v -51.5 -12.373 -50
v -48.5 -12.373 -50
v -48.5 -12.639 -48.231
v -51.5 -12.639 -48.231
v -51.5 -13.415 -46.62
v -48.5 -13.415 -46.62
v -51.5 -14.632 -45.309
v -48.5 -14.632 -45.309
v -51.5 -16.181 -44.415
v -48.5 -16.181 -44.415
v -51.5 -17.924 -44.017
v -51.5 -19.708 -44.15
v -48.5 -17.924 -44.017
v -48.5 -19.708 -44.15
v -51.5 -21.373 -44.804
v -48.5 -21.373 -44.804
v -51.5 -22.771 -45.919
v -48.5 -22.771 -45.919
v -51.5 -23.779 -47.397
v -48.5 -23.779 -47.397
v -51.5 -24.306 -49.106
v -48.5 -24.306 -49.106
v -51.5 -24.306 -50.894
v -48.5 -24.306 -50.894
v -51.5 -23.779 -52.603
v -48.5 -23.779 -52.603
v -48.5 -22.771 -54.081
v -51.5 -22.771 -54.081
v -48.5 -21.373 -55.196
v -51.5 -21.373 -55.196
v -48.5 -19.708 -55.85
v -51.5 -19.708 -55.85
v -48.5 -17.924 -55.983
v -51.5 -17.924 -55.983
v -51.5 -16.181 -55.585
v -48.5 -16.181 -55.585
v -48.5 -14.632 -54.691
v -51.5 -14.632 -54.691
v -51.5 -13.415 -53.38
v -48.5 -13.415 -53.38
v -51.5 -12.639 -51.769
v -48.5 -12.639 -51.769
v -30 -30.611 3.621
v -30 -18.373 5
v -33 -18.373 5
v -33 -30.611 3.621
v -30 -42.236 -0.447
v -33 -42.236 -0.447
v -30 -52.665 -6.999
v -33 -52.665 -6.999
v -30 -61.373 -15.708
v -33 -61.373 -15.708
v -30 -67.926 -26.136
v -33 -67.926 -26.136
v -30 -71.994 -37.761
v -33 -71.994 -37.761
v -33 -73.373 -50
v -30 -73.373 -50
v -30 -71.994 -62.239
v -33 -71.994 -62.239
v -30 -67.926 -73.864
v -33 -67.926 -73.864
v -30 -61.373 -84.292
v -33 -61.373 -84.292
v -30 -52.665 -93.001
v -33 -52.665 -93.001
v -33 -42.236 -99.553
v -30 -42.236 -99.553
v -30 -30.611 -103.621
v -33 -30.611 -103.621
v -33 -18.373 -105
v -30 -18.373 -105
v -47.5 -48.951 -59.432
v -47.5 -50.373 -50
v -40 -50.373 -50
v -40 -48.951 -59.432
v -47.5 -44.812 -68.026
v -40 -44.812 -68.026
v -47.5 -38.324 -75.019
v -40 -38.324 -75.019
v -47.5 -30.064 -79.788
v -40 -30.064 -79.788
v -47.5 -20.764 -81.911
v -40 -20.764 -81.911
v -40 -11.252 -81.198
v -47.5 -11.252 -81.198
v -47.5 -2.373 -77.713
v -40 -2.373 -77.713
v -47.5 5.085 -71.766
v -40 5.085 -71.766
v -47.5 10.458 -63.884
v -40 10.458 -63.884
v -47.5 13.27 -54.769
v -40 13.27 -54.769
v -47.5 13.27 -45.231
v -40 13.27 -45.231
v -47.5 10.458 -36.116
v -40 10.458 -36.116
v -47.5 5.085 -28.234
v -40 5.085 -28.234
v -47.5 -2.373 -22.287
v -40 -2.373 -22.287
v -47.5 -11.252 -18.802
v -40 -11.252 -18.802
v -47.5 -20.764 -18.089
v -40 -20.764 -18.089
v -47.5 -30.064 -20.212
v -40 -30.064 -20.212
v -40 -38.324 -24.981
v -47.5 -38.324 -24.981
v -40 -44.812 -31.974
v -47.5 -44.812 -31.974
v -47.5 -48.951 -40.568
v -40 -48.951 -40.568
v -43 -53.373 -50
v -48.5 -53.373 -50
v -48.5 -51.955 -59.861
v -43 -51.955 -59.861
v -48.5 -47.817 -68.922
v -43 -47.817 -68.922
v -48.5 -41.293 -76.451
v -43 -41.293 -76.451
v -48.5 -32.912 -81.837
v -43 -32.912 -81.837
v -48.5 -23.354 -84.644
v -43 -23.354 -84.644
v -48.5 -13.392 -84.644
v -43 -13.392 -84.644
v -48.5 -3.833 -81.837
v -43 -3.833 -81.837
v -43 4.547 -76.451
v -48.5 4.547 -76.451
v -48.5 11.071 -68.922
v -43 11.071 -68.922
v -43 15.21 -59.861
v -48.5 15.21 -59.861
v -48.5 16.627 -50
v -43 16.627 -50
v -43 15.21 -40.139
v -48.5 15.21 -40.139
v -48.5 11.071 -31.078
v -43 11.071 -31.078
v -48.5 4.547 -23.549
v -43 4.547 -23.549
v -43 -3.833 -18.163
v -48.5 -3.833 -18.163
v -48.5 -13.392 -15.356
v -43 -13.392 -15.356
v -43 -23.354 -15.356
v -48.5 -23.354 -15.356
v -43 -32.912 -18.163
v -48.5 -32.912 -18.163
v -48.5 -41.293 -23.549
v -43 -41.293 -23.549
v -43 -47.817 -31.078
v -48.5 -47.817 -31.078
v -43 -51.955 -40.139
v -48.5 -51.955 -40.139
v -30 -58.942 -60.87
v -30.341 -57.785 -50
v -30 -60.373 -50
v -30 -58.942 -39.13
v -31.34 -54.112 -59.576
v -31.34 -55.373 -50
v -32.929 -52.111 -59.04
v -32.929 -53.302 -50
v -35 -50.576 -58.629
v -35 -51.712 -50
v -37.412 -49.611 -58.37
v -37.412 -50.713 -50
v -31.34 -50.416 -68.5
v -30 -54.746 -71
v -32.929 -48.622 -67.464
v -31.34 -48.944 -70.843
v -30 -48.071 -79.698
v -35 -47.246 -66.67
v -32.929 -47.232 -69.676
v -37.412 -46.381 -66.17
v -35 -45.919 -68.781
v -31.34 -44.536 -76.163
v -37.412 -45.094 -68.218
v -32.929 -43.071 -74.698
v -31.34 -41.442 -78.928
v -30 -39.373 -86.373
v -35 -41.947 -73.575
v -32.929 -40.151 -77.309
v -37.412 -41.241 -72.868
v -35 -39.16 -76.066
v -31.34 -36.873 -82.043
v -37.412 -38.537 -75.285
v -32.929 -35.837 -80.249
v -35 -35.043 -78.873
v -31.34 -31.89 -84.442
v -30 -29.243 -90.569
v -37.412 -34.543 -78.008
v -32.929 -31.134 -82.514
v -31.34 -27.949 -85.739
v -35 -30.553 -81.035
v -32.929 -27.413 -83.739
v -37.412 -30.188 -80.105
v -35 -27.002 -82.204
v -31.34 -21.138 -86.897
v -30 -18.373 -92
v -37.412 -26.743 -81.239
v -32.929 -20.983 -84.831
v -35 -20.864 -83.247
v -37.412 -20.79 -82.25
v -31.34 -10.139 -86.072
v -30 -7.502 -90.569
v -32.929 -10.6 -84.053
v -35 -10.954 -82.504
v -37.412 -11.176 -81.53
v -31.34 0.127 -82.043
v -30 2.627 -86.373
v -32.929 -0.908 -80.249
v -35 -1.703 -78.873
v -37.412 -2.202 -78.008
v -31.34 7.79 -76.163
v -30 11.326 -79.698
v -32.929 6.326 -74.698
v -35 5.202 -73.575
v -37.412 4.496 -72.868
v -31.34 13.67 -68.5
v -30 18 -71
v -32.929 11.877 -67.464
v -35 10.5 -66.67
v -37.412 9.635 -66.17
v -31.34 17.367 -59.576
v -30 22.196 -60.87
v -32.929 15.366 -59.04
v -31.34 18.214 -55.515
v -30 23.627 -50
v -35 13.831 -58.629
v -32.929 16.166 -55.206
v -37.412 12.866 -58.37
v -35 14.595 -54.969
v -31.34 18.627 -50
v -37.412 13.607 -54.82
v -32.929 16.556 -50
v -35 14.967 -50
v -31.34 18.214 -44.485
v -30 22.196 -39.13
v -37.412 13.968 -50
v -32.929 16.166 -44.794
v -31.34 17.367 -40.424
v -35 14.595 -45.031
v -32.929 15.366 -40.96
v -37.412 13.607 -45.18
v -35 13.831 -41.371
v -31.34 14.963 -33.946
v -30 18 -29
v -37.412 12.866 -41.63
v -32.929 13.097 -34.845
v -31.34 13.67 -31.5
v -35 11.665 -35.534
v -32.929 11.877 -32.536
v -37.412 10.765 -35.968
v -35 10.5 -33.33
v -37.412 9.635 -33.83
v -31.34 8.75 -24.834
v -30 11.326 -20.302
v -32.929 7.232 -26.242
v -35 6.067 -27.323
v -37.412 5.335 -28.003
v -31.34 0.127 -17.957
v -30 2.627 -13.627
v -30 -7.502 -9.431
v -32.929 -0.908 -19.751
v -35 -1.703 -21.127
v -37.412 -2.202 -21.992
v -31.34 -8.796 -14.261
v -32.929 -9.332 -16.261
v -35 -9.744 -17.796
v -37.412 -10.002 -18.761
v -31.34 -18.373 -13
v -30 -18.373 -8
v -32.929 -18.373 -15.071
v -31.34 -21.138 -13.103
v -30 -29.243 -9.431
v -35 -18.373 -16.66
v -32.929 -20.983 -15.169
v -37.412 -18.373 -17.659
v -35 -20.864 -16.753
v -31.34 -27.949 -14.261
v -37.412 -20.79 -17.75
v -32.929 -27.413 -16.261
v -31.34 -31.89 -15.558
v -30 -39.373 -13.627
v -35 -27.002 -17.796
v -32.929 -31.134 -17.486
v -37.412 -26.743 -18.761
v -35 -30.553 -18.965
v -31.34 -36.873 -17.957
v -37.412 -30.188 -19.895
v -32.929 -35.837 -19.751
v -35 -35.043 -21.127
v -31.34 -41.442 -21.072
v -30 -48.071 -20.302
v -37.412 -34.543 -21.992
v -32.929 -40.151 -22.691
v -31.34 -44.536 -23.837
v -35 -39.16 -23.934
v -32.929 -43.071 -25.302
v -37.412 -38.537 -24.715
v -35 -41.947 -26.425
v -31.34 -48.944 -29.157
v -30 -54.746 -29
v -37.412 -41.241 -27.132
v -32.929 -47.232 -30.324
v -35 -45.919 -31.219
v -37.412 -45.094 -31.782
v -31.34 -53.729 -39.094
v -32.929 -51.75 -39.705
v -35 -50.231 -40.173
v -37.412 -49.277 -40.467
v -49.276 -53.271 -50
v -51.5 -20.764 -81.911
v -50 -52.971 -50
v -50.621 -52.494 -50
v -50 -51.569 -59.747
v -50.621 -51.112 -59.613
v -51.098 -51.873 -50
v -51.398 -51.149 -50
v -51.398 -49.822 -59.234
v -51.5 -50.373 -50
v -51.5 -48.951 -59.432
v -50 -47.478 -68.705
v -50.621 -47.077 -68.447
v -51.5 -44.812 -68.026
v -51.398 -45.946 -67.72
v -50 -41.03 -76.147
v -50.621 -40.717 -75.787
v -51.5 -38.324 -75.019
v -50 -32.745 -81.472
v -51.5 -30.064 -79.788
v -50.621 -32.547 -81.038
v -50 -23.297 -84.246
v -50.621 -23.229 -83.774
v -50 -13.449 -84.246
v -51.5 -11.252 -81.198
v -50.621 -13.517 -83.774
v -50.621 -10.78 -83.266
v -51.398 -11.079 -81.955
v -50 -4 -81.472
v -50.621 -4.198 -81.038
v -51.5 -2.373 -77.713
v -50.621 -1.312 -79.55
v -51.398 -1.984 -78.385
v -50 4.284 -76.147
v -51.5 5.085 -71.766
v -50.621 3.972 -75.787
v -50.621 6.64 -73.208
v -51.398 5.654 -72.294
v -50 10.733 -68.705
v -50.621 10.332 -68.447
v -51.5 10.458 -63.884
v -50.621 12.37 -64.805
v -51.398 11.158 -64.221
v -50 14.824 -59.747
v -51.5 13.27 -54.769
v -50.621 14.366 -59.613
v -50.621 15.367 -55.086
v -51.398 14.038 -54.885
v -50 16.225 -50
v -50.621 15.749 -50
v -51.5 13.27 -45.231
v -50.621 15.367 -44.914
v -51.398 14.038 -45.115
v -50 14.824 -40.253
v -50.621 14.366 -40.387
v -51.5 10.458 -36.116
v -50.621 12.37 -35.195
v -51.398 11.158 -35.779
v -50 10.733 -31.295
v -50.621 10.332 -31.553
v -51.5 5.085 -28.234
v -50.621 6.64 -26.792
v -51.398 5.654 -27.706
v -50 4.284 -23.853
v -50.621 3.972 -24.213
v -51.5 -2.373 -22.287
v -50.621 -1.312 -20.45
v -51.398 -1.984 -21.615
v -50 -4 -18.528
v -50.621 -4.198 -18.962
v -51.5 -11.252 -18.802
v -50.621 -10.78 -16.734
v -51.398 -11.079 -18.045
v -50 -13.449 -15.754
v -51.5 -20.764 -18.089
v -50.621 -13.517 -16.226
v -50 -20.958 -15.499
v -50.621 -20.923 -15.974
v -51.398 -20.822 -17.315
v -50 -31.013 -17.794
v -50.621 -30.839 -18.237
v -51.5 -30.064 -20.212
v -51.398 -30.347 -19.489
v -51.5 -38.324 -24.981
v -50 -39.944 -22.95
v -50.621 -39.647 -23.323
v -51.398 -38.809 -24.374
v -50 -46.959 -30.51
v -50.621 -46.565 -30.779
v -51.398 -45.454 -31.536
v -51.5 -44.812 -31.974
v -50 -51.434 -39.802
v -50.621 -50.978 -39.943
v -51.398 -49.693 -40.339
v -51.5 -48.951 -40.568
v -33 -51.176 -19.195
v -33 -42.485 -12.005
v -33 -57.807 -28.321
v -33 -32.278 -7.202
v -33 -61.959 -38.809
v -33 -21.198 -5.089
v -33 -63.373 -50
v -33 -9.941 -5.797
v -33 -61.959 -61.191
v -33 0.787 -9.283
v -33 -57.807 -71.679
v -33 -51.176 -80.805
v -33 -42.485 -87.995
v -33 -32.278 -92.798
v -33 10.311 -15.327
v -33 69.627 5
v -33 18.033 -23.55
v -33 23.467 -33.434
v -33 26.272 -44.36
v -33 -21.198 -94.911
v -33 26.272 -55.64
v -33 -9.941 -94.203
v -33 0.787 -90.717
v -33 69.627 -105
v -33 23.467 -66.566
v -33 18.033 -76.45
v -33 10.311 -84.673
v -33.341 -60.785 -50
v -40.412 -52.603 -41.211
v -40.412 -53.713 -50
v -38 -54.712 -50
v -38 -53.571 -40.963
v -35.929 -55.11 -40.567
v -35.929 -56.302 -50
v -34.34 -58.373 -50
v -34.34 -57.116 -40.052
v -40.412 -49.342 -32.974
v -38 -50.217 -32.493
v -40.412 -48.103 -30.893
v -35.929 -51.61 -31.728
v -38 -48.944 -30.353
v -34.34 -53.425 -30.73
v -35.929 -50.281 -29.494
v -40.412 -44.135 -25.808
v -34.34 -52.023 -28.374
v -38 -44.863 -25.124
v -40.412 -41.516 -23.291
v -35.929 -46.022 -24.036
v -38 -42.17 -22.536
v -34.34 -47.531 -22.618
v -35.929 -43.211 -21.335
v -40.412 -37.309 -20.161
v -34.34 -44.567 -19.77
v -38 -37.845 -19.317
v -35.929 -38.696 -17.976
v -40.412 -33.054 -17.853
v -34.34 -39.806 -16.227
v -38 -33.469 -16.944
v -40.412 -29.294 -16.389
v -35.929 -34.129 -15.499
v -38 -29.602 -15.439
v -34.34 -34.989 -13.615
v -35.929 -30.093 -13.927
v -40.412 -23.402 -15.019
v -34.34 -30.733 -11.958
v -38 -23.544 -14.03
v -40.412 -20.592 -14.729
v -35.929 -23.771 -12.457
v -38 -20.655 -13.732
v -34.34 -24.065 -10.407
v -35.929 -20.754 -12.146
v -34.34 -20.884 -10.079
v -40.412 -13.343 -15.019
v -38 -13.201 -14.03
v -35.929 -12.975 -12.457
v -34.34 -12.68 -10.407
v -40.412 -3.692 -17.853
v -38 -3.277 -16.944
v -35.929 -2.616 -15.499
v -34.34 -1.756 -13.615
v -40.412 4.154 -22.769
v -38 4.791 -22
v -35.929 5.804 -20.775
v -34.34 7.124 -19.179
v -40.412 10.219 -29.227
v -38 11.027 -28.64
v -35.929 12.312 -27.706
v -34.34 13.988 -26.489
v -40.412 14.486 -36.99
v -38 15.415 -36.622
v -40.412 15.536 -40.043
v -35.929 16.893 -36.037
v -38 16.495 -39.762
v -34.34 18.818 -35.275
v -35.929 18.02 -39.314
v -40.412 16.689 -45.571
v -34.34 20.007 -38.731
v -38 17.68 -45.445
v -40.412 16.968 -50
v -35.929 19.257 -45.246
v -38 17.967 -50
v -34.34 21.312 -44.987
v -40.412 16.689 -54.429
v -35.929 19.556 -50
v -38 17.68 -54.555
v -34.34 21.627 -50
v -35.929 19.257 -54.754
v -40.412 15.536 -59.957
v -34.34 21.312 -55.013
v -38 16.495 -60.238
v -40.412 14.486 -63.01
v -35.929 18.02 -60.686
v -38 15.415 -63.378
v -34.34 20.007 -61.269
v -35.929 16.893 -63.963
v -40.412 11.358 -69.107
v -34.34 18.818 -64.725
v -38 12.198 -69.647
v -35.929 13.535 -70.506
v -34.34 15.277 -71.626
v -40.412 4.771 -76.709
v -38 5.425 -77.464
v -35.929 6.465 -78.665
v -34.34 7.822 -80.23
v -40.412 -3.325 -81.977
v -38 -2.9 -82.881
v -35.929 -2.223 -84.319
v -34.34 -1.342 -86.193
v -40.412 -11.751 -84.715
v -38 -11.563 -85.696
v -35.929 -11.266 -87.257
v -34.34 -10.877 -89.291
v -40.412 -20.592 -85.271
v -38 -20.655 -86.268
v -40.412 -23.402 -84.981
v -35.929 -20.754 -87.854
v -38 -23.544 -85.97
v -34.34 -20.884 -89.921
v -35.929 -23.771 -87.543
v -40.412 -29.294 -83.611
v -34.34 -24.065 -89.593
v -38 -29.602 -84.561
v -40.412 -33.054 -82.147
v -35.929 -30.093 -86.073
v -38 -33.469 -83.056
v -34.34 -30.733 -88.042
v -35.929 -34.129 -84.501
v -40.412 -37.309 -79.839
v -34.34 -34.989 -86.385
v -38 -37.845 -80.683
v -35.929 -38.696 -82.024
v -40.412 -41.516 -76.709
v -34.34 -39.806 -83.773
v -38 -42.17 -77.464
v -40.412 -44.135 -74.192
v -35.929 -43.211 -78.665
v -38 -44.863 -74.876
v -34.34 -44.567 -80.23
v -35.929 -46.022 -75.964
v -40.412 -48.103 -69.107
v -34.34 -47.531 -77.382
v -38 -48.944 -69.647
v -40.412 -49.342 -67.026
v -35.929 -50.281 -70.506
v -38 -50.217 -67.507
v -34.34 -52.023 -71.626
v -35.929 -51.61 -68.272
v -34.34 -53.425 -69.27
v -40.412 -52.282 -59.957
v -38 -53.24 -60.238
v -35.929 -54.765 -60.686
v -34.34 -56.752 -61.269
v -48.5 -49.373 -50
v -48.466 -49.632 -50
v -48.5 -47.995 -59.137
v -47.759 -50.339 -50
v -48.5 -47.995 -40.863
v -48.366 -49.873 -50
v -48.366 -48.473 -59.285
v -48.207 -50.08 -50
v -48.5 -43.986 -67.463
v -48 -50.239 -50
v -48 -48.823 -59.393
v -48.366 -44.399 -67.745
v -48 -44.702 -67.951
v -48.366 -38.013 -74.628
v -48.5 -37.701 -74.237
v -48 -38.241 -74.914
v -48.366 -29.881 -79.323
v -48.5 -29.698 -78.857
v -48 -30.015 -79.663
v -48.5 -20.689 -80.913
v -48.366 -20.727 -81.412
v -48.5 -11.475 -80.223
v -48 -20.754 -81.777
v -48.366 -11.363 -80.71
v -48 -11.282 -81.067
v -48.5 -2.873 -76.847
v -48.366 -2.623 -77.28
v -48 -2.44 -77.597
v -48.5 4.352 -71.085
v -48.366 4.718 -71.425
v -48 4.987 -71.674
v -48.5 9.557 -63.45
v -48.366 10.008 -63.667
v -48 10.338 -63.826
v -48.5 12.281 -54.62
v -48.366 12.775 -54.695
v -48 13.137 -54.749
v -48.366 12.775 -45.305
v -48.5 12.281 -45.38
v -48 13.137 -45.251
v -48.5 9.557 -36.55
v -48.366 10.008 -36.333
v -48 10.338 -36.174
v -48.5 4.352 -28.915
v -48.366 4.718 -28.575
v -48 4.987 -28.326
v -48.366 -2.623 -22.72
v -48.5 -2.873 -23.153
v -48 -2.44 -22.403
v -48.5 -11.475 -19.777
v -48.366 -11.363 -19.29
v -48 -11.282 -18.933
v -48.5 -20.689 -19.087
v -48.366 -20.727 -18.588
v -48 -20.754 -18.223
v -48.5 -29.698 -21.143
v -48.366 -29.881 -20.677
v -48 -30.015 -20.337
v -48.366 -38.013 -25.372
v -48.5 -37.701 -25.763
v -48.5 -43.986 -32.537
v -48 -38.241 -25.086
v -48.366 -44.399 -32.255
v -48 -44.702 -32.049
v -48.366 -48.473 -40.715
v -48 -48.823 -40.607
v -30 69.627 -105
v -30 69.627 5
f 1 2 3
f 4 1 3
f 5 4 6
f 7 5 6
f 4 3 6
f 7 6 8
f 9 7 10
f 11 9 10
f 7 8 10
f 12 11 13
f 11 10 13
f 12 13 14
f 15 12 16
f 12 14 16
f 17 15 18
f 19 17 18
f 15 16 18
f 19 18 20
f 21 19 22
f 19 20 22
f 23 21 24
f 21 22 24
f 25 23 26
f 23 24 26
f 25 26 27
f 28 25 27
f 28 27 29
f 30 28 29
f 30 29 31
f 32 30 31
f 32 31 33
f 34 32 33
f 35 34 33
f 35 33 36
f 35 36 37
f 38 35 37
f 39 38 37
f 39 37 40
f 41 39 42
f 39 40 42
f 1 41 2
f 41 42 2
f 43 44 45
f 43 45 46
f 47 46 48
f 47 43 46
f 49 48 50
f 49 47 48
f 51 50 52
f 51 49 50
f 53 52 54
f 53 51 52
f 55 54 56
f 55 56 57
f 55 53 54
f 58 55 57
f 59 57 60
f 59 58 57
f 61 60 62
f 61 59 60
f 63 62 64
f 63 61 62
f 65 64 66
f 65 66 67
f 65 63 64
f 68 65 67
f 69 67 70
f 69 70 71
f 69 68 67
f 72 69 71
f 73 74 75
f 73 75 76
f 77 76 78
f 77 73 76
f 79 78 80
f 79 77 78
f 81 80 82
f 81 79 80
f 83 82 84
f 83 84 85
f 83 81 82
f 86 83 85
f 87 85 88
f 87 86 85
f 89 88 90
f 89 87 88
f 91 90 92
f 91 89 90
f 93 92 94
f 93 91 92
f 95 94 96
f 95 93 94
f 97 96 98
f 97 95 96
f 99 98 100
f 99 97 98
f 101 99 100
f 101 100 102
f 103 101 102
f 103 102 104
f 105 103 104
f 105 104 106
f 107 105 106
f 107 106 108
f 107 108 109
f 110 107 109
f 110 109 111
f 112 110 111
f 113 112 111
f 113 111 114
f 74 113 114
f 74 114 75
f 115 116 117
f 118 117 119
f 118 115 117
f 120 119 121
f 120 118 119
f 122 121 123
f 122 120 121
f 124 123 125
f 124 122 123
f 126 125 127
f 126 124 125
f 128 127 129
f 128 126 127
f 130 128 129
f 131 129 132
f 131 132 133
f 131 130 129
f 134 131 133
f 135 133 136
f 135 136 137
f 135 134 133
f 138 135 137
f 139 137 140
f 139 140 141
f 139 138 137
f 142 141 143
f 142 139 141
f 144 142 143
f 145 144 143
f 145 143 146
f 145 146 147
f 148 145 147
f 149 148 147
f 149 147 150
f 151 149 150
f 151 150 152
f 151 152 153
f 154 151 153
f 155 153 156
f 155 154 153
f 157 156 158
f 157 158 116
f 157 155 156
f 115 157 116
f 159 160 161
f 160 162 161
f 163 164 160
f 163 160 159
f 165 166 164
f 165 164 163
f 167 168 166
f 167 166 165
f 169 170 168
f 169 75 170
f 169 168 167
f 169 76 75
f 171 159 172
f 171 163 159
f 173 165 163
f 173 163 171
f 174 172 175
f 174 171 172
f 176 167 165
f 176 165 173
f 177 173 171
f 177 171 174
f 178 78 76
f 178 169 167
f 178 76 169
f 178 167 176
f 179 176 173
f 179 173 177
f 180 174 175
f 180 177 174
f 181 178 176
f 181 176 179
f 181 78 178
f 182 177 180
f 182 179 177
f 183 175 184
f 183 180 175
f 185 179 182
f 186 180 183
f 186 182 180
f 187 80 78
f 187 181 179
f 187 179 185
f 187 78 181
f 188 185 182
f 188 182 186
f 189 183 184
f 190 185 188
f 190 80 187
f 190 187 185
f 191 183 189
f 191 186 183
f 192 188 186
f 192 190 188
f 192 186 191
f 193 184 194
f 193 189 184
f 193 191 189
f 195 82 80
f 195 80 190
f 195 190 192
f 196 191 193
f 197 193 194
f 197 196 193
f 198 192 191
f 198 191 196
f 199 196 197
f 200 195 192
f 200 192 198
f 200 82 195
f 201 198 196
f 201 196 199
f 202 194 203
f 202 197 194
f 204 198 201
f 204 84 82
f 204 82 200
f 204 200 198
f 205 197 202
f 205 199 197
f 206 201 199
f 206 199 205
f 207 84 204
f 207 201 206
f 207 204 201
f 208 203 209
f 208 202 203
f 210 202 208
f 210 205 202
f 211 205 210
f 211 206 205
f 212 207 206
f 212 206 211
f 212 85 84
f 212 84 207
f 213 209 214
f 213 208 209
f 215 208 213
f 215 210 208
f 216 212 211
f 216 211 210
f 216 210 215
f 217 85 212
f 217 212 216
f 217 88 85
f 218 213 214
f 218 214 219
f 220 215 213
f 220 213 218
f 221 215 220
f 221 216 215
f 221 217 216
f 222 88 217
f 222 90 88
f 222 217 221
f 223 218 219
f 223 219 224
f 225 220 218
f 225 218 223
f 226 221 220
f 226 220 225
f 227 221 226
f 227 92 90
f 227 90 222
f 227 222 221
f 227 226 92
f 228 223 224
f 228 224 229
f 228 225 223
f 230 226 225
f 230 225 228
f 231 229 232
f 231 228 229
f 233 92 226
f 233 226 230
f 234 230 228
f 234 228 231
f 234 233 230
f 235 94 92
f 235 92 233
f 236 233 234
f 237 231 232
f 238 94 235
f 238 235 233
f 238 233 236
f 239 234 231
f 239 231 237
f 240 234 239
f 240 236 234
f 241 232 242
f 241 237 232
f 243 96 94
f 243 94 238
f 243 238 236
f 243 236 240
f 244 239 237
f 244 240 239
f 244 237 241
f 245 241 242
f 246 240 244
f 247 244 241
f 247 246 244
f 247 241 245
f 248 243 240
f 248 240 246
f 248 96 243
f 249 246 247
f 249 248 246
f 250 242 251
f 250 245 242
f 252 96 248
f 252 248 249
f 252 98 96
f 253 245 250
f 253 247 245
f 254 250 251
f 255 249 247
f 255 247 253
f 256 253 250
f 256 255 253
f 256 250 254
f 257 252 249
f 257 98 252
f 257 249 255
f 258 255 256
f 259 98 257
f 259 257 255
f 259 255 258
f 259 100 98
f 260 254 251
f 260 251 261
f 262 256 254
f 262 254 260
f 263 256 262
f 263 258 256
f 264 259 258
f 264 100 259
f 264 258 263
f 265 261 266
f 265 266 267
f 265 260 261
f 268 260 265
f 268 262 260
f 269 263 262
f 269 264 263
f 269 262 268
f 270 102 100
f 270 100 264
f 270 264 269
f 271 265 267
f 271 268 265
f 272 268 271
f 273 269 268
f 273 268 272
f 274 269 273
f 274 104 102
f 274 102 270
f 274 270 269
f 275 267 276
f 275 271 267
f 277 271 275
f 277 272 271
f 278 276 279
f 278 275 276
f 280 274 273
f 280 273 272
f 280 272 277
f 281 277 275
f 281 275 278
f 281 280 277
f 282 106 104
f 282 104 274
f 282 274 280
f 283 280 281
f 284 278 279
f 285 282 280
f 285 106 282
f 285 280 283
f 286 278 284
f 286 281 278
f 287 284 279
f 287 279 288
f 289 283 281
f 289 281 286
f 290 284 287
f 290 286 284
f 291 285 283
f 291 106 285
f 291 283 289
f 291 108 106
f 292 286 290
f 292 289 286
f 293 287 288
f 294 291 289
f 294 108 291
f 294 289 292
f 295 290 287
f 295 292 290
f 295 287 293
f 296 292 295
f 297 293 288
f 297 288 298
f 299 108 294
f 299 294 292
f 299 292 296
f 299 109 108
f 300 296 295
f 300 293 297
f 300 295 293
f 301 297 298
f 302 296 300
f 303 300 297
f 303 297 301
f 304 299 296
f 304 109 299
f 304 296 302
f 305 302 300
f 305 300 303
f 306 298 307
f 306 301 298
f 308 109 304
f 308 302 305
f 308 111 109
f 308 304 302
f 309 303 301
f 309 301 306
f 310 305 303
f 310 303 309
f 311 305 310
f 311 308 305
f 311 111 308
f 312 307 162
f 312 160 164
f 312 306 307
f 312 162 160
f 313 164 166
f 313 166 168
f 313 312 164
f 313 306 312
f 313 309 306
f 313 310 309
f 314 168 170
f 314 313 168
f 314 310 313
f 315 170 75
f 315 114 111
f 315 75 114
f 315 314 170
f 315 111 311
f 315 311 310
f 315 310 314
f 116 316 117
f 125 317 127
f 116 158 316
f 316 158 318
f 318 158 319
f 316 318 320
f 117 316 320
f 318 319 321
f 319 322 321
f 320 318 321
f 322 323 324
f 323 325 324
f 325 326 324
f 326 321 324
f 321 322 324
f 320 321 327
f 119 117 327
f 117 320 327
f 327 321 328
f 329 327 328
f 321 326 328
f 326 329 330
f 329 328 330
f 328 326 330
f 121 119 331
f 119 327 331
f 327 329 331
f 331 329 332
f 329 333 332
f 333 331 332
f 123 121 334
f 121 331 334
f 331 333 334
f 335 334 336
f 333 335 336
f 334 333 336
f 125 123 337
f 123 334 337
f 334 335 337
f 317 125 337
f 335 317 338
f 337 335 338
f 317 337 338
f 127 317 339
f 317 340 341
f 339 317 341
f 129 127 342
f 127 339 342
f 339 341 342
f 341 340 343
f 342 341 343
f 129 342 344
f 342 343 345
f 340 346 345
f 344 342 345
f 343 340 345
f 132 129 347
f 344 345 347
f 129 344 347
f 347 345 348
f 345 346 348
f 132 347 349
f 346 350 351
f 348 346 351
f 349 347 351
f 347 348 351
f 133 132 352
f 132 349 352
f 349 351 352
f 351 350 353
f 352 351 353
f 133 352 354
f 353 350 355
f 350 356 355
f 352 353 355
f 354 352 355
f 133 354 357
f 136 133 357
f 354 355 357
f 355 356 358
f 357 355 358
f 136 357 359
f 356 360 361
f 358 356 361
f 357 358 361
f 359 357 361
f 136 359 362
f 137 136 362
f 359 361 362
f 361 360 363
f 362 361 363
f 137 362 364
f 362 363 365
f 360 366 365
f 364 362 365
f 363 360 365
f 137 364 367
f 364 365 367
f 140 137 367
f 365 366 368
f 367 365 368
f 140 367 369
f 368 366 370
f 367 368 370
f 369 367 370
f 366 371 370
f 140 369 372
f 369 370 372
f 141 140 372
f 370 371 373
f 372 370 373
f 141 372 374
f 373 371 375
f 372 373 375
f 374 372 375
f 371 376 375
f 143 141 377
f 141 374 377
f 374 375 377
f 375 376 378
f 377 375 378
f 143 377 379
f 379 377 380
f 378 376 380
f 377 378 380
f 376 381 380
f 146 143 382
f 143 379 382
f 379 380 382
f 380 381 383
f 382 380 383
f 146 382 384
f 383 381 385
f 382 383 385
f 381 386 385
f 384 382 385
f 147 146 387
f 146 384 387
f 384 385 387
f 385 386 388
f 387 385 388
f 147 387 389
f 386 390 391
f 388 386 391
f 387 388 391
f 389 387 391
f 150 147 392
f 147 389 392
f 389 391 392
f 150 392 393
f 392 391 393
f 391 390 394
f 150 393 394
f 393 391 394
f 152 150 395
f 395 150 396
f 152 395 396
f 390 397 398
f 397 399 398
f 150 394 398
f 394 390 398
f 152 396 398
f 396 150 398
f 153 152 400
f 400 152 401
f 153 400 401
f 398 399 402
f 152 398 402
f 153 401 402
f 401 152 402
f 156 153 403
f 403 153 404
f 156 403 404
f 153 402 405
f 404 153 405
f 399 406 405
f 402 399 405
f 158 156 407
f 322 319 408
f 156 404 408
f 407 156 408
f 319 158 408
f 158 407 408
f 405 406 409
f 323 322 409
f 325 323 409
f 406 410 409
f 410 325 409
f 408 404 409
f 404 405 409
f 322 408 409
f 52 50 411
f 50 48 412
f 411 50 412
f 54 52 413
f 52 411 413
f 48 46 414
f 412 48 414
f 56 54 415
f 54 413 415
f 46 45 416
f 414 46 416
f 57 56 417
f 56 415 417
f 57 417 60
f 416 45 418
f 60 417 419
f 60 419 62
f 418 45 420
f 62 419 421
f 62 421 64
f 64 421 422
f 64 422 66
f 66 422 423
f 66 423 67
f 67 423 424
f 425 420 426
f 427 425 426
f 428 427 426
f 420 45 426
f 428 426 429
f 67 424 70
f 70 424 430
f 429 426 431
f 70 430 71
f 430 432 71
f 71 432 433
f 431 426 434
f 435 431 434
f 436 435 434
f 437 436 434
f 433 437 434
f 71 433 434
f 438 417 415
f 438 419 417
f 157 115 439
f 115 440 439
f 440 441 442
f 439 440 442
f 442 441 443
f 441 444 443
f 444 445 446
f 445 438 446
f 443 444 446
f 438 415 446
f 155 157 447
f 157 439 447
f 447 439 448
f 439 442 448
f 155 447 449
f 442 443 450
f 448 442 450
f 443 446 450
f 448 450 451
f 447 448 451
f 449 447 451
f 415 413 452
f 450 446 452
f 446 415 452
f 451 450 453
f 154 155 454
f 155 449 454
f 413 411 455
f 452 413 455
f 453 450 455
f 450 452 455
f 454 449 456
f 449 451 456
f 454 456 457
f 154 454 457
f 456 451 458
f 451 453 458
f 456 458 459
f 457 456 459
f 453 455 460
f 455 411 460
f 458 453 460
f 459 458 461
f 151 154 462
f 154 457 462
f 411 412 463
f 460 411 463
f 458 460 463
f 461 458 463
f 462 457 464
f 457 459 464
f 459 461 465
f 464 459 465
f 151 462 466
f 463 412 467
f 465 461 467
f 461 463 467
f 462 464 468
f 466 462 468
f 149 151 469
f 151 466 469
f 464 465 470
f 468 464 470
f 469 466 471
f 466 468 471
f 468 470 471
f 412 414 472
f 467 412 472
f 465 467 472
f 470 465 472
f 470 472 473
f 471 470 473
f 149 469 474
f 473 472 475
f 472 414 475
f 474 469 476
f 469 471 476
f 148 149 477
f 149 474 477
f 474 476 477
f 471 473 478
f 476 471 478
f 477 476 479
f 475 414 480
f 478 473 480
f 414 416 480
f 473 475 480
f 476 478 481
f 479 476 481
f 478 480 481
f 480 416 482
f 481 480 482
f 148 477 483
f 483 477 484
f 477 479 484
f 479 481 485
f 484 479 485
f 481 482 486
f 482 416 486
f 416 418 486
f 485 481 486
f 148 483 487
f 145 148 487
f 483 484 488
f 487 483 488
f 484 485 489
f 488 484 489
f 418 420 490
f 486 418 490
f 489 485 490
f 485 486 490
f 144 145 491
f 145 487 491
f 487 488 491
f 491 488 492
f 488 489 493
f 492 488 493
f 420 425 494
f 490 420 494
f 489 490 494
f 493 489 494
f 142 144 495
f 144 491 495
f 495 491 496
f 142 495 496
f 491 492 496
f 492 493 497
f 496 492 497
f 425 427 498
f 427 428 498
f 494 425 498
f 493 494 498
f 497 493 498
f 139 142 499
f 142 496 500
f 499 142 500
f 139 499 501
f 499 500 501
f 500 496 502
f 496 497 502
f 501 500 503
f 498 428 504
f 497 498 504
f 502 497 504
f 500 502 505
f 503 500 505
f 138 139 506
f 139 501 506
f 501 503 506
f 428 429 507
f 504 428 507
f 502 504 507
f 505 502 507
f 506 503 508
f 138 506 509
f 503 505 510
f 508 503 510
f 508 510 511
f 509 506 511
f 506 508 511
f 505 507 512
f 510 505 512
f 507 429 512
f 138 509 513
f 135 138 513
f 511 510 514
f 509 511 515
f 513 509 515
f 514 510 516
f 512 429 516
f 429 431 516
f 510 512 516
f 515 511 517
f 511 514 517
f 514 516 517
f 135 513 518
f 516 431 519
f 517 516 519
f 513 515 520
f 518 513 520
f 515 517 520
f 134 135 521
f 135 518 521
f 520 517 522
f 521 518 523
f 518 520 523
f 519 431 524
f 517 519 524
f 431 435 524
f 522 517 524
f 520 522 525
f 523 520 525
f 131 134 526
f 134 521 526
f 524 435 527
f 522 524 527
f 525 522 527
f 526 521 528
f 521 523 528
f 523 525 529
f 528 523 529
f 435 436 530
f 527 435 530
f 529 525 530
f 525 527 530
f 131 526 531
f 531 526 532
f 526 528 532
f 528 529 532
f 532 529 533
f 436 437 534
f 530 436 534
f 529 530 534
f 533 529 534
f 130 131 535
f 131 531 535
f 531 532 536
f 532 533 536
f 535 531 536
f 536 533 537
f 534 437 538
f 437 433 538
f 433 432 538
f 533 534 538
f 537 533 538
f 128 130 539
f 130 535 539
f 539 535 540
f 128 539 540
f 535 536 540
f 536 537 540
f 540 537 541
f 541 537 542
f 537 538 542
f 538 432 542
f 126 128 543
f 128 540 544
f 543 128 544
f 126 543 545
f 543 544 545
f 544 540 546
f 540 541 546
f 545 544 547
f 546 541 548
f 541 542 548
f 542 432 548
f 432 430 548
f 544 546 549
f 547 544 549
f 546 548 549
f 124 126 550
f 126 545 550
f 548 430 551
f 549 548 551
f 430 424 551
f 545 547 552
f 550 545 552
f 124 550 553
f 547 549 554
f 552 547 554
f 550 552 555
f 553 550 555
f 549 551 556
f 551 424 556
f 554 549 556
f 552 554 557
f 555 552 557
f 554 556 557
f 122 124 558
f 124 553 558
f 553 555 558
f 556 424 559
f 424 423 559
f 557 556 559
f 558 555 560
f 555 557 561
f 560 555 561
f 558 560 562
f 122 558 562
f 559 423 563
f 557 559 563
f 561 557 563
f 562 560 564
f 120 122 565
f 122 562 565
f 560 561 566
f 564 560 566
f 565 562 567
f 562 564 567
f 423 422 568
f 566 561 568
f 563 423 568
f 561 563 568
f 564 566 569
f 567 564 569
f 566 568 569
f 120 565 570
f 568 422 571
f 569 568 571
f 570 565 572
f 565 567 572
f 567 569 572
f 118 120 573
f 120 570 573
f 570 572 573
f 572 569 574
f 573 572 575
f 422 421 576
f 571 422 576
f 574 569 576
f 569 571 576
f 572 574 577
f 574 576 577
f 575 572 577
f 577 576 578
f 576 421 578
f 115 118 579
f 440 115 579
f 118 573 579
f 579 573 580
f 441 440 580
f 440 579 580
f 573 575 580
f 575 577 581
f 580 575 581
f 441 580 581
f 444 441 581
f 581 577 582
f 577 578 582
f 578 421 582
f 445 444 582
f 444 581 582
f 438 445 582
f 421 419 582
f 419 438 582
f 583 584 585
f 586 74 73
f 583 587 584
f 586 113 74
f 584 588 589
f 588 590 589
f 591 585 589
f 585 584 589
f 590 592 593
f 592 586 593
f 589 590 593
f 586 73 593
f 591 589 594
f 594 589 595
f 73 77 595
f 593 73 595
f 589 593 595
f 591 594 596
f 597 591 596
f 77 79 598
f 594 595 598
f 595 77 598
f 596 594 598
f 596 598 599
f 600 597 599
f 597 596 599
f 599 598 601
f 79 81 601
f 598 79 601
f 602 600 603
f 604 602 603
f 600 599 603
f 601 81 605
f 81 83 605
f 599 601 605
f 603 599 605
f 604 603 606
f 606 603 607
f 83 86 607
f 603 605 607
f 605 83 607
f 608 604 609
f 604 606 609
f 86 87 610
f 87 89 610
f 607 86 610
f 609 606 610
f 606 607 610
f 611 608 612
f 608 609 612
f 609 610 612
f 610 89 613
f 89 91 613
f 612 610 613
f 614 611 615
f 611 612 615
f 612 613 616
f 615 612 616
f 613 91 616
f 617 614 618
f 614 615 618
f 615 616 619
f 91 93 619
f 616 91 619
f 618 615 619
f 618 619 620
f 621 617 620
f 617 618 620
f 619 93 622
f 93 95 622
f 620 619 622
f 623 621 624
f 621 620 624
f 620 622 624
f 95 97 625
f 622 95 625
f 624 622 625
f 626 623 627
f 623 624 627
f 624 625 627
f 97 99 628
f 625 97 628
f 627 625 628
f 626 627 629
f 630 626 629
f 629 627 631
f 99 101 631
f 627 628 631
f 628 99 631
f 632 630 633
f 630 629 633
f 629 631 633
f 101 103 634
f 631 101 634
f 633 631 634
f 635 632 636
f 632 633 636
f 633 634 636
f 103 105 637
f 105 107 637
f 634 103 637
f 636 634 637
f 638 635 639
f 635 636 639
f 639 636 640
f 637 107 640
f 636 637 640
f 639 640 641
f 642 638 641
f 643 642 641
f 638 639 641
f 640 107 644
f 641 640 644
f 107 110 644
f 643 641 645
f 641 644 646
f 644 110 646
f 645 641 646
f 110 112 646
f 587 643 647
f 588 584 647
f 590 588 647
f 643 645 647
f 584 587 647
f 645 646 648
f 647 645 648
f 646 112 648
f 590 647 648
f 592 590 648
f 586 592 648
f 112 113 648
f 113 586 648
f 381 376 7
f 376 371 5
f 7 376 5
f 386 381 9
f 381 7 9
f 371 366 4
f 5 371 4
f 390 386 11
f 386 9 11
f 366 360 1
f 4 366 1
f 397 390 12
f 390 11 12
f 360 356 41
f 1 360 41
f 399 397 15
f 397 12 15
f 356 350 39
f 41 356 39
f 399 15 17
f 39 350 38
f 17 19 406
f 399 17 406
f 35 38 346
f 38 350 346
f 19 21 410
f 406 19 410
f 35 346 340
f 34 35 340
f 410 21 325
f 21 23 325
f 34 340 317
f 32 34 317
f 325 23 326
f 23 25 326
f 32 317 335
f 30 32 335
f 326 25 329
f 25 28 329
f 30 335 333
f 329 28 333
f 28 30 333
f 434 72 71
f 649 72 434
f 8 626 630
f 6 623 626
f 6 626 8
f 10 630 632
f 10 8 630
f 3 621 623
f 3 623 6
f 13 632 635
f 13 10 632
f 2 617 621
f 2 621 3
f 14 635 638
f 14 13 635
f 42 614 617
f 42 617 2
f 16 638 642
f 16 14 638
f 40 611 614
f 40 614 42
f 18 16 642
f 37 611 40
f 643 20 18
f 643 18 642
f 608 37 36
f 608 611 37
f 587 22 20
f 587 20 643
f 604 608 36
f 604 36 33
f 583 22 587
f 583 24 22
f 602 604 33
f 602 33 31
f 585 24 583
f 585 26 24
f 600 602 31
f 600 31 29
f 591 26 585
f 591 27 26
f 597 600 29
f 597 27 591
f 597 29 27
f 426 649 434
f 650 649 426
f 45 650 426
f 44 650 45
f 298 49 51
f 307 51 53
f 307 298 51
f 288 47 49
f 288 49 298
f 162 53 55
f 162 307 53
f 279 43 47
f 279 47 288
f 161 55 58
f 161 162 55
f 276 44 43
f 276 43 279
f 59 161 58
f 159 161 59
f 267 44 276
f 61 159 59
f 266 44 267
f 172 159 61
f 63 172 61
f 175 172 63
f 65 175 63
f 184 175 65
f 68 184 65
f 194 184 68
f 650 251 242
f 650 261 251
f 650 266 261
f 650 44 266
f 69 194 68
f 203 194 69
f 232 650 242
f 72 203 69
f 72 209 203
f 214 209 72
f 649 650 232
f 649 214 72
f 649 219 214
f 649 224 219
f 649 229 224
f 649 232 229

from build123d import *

# Parameters (mm, degrees)
MOTOR_RING_DEPTH      = 12.5
MOTOR_RING_DEPTH_BACK = 6
SKETCH1_R             = 35
SKETCH1_R_2           = 32
SKETCH3_R             = 35
SKETCH3_R_2           = 6
MOTOR_CAP_DEPTH       = 3
BULK_START            = 3
SKETCH2_R             = 32
BULK_EXTRUDE_DEPTH    = 3
FILLET2_R             = 10
FILLET3_R             = 10
FILLET4_R             = 3
FILLET5_R             = 1


with BuildPart() as part:
    # Sketch1 → MOTOR RING (new, two sides: drawn at the far end of the back side and taken through both)
    with BuildSketch(Plane(origin=(-42.5, 0, 0), x_dir=(0, 0, -1), z_dir=(1, 0, 0)).offset(-MOTOR_RING_DEPTH_BACK)):
        with Locations(Location((50, -18.372727273, 0), (0, 0, 270))):
            Circle(SKETCH1_R)
        with Locations(Location((50, -18.372727273, 0), (0, 0, 270))):
            Circle(SKETCH1_R_2, mode=Mode.SUBTRACT)
    extrude(amount=MOTOR_RING_DEPTH + MOTOR_RING_DEPTH_BACK)

    # Sketch3 → MOTOR CAP (add)
    with BuildSketch(Plane(origin=(-48.5, 0, 0), x_dir=(0, 0, -1), z_dir=(1, 0, 0))):
        with Locations(Location((50, -18.372727273, 0), (0, 0, 270))):
            Circle(SKETCH3_R)
        with Locations(Location((50, -18.372727273, 0), (0, 0, 90))):
            Circle(SKETCH3_R_2, mode=Mode.SUBTRACT)
    extrude(amount=-MOTOR_CAP_DEPTH)

    # Sketch2 → BULK EXTRUDE (add)
    with BuildSketch(Plane.ZY.offset(27).offset(BULK_START)):
        with BuildLine():
            Line((-105, -18.372727273), (-105, 69.627272727))
            Line((-105, 69.627272727), (5, 69.627272727))
            Line((5, 69.627272727), (5, -18.372727273))
            ThreePointArc((5, -18.372727273), (-50, -73.372727273), (-105, -18.372727273))
        make_face()
        with Locations(Location((-50, -18.372727273, 0), (0, 0, 270))):
            Circle(SKETCH2_R, mode=Mode.SUBTRACT)
    extrude(amount=BULK_EXTRUDE_DEPTH)

    # Fillet2
    # the kernel refuses this fillet: 10 mm, written as the material it adds along each edge
    with BuildSketch(Plane(origin=(-33, -18.372727273, -50), x_dir=(0, -1, 0), z_dir=(0, 0, -1))) as fillet2_piece_1:
        with BuildLine():
            CenterArc((35 + FILLET2_R, FILLET2_R), FILLET2_R, 180, 90)
            Line((35 + FILLET2_R, 0), (35, 0))
            Line((35, 0), (35, FILLET2_R))
        make_face()
    revolve(axis=Axis((-33, -18.372727273, -50), (-1, 0, 0)))

    # Fillet3
    fillet3_edges = [part.edges().sort_by_distance(p)[0] for p in [
        (-30, 13.627272727, -50),
    ]]
    fillet(fillet3_edges, radius=FILLET3_R)

    # Fillet4
    fillet4_edges = [part.edges().sort_by_distance(p)[0] for p in [
        (-51.5, 16.627272727, -50),
    ]]
    fillet(fillet4_edges, radius=FILLET4_R)

    # Fillet5
    fillet5_edges = [part.edges().sort_by_distance(p)[0] for p in [
        (-48.5, 13.627272727, -50),
    ]]
    fillet(fillet5_edges, radius=FILLET5_R)


solid = part.part
